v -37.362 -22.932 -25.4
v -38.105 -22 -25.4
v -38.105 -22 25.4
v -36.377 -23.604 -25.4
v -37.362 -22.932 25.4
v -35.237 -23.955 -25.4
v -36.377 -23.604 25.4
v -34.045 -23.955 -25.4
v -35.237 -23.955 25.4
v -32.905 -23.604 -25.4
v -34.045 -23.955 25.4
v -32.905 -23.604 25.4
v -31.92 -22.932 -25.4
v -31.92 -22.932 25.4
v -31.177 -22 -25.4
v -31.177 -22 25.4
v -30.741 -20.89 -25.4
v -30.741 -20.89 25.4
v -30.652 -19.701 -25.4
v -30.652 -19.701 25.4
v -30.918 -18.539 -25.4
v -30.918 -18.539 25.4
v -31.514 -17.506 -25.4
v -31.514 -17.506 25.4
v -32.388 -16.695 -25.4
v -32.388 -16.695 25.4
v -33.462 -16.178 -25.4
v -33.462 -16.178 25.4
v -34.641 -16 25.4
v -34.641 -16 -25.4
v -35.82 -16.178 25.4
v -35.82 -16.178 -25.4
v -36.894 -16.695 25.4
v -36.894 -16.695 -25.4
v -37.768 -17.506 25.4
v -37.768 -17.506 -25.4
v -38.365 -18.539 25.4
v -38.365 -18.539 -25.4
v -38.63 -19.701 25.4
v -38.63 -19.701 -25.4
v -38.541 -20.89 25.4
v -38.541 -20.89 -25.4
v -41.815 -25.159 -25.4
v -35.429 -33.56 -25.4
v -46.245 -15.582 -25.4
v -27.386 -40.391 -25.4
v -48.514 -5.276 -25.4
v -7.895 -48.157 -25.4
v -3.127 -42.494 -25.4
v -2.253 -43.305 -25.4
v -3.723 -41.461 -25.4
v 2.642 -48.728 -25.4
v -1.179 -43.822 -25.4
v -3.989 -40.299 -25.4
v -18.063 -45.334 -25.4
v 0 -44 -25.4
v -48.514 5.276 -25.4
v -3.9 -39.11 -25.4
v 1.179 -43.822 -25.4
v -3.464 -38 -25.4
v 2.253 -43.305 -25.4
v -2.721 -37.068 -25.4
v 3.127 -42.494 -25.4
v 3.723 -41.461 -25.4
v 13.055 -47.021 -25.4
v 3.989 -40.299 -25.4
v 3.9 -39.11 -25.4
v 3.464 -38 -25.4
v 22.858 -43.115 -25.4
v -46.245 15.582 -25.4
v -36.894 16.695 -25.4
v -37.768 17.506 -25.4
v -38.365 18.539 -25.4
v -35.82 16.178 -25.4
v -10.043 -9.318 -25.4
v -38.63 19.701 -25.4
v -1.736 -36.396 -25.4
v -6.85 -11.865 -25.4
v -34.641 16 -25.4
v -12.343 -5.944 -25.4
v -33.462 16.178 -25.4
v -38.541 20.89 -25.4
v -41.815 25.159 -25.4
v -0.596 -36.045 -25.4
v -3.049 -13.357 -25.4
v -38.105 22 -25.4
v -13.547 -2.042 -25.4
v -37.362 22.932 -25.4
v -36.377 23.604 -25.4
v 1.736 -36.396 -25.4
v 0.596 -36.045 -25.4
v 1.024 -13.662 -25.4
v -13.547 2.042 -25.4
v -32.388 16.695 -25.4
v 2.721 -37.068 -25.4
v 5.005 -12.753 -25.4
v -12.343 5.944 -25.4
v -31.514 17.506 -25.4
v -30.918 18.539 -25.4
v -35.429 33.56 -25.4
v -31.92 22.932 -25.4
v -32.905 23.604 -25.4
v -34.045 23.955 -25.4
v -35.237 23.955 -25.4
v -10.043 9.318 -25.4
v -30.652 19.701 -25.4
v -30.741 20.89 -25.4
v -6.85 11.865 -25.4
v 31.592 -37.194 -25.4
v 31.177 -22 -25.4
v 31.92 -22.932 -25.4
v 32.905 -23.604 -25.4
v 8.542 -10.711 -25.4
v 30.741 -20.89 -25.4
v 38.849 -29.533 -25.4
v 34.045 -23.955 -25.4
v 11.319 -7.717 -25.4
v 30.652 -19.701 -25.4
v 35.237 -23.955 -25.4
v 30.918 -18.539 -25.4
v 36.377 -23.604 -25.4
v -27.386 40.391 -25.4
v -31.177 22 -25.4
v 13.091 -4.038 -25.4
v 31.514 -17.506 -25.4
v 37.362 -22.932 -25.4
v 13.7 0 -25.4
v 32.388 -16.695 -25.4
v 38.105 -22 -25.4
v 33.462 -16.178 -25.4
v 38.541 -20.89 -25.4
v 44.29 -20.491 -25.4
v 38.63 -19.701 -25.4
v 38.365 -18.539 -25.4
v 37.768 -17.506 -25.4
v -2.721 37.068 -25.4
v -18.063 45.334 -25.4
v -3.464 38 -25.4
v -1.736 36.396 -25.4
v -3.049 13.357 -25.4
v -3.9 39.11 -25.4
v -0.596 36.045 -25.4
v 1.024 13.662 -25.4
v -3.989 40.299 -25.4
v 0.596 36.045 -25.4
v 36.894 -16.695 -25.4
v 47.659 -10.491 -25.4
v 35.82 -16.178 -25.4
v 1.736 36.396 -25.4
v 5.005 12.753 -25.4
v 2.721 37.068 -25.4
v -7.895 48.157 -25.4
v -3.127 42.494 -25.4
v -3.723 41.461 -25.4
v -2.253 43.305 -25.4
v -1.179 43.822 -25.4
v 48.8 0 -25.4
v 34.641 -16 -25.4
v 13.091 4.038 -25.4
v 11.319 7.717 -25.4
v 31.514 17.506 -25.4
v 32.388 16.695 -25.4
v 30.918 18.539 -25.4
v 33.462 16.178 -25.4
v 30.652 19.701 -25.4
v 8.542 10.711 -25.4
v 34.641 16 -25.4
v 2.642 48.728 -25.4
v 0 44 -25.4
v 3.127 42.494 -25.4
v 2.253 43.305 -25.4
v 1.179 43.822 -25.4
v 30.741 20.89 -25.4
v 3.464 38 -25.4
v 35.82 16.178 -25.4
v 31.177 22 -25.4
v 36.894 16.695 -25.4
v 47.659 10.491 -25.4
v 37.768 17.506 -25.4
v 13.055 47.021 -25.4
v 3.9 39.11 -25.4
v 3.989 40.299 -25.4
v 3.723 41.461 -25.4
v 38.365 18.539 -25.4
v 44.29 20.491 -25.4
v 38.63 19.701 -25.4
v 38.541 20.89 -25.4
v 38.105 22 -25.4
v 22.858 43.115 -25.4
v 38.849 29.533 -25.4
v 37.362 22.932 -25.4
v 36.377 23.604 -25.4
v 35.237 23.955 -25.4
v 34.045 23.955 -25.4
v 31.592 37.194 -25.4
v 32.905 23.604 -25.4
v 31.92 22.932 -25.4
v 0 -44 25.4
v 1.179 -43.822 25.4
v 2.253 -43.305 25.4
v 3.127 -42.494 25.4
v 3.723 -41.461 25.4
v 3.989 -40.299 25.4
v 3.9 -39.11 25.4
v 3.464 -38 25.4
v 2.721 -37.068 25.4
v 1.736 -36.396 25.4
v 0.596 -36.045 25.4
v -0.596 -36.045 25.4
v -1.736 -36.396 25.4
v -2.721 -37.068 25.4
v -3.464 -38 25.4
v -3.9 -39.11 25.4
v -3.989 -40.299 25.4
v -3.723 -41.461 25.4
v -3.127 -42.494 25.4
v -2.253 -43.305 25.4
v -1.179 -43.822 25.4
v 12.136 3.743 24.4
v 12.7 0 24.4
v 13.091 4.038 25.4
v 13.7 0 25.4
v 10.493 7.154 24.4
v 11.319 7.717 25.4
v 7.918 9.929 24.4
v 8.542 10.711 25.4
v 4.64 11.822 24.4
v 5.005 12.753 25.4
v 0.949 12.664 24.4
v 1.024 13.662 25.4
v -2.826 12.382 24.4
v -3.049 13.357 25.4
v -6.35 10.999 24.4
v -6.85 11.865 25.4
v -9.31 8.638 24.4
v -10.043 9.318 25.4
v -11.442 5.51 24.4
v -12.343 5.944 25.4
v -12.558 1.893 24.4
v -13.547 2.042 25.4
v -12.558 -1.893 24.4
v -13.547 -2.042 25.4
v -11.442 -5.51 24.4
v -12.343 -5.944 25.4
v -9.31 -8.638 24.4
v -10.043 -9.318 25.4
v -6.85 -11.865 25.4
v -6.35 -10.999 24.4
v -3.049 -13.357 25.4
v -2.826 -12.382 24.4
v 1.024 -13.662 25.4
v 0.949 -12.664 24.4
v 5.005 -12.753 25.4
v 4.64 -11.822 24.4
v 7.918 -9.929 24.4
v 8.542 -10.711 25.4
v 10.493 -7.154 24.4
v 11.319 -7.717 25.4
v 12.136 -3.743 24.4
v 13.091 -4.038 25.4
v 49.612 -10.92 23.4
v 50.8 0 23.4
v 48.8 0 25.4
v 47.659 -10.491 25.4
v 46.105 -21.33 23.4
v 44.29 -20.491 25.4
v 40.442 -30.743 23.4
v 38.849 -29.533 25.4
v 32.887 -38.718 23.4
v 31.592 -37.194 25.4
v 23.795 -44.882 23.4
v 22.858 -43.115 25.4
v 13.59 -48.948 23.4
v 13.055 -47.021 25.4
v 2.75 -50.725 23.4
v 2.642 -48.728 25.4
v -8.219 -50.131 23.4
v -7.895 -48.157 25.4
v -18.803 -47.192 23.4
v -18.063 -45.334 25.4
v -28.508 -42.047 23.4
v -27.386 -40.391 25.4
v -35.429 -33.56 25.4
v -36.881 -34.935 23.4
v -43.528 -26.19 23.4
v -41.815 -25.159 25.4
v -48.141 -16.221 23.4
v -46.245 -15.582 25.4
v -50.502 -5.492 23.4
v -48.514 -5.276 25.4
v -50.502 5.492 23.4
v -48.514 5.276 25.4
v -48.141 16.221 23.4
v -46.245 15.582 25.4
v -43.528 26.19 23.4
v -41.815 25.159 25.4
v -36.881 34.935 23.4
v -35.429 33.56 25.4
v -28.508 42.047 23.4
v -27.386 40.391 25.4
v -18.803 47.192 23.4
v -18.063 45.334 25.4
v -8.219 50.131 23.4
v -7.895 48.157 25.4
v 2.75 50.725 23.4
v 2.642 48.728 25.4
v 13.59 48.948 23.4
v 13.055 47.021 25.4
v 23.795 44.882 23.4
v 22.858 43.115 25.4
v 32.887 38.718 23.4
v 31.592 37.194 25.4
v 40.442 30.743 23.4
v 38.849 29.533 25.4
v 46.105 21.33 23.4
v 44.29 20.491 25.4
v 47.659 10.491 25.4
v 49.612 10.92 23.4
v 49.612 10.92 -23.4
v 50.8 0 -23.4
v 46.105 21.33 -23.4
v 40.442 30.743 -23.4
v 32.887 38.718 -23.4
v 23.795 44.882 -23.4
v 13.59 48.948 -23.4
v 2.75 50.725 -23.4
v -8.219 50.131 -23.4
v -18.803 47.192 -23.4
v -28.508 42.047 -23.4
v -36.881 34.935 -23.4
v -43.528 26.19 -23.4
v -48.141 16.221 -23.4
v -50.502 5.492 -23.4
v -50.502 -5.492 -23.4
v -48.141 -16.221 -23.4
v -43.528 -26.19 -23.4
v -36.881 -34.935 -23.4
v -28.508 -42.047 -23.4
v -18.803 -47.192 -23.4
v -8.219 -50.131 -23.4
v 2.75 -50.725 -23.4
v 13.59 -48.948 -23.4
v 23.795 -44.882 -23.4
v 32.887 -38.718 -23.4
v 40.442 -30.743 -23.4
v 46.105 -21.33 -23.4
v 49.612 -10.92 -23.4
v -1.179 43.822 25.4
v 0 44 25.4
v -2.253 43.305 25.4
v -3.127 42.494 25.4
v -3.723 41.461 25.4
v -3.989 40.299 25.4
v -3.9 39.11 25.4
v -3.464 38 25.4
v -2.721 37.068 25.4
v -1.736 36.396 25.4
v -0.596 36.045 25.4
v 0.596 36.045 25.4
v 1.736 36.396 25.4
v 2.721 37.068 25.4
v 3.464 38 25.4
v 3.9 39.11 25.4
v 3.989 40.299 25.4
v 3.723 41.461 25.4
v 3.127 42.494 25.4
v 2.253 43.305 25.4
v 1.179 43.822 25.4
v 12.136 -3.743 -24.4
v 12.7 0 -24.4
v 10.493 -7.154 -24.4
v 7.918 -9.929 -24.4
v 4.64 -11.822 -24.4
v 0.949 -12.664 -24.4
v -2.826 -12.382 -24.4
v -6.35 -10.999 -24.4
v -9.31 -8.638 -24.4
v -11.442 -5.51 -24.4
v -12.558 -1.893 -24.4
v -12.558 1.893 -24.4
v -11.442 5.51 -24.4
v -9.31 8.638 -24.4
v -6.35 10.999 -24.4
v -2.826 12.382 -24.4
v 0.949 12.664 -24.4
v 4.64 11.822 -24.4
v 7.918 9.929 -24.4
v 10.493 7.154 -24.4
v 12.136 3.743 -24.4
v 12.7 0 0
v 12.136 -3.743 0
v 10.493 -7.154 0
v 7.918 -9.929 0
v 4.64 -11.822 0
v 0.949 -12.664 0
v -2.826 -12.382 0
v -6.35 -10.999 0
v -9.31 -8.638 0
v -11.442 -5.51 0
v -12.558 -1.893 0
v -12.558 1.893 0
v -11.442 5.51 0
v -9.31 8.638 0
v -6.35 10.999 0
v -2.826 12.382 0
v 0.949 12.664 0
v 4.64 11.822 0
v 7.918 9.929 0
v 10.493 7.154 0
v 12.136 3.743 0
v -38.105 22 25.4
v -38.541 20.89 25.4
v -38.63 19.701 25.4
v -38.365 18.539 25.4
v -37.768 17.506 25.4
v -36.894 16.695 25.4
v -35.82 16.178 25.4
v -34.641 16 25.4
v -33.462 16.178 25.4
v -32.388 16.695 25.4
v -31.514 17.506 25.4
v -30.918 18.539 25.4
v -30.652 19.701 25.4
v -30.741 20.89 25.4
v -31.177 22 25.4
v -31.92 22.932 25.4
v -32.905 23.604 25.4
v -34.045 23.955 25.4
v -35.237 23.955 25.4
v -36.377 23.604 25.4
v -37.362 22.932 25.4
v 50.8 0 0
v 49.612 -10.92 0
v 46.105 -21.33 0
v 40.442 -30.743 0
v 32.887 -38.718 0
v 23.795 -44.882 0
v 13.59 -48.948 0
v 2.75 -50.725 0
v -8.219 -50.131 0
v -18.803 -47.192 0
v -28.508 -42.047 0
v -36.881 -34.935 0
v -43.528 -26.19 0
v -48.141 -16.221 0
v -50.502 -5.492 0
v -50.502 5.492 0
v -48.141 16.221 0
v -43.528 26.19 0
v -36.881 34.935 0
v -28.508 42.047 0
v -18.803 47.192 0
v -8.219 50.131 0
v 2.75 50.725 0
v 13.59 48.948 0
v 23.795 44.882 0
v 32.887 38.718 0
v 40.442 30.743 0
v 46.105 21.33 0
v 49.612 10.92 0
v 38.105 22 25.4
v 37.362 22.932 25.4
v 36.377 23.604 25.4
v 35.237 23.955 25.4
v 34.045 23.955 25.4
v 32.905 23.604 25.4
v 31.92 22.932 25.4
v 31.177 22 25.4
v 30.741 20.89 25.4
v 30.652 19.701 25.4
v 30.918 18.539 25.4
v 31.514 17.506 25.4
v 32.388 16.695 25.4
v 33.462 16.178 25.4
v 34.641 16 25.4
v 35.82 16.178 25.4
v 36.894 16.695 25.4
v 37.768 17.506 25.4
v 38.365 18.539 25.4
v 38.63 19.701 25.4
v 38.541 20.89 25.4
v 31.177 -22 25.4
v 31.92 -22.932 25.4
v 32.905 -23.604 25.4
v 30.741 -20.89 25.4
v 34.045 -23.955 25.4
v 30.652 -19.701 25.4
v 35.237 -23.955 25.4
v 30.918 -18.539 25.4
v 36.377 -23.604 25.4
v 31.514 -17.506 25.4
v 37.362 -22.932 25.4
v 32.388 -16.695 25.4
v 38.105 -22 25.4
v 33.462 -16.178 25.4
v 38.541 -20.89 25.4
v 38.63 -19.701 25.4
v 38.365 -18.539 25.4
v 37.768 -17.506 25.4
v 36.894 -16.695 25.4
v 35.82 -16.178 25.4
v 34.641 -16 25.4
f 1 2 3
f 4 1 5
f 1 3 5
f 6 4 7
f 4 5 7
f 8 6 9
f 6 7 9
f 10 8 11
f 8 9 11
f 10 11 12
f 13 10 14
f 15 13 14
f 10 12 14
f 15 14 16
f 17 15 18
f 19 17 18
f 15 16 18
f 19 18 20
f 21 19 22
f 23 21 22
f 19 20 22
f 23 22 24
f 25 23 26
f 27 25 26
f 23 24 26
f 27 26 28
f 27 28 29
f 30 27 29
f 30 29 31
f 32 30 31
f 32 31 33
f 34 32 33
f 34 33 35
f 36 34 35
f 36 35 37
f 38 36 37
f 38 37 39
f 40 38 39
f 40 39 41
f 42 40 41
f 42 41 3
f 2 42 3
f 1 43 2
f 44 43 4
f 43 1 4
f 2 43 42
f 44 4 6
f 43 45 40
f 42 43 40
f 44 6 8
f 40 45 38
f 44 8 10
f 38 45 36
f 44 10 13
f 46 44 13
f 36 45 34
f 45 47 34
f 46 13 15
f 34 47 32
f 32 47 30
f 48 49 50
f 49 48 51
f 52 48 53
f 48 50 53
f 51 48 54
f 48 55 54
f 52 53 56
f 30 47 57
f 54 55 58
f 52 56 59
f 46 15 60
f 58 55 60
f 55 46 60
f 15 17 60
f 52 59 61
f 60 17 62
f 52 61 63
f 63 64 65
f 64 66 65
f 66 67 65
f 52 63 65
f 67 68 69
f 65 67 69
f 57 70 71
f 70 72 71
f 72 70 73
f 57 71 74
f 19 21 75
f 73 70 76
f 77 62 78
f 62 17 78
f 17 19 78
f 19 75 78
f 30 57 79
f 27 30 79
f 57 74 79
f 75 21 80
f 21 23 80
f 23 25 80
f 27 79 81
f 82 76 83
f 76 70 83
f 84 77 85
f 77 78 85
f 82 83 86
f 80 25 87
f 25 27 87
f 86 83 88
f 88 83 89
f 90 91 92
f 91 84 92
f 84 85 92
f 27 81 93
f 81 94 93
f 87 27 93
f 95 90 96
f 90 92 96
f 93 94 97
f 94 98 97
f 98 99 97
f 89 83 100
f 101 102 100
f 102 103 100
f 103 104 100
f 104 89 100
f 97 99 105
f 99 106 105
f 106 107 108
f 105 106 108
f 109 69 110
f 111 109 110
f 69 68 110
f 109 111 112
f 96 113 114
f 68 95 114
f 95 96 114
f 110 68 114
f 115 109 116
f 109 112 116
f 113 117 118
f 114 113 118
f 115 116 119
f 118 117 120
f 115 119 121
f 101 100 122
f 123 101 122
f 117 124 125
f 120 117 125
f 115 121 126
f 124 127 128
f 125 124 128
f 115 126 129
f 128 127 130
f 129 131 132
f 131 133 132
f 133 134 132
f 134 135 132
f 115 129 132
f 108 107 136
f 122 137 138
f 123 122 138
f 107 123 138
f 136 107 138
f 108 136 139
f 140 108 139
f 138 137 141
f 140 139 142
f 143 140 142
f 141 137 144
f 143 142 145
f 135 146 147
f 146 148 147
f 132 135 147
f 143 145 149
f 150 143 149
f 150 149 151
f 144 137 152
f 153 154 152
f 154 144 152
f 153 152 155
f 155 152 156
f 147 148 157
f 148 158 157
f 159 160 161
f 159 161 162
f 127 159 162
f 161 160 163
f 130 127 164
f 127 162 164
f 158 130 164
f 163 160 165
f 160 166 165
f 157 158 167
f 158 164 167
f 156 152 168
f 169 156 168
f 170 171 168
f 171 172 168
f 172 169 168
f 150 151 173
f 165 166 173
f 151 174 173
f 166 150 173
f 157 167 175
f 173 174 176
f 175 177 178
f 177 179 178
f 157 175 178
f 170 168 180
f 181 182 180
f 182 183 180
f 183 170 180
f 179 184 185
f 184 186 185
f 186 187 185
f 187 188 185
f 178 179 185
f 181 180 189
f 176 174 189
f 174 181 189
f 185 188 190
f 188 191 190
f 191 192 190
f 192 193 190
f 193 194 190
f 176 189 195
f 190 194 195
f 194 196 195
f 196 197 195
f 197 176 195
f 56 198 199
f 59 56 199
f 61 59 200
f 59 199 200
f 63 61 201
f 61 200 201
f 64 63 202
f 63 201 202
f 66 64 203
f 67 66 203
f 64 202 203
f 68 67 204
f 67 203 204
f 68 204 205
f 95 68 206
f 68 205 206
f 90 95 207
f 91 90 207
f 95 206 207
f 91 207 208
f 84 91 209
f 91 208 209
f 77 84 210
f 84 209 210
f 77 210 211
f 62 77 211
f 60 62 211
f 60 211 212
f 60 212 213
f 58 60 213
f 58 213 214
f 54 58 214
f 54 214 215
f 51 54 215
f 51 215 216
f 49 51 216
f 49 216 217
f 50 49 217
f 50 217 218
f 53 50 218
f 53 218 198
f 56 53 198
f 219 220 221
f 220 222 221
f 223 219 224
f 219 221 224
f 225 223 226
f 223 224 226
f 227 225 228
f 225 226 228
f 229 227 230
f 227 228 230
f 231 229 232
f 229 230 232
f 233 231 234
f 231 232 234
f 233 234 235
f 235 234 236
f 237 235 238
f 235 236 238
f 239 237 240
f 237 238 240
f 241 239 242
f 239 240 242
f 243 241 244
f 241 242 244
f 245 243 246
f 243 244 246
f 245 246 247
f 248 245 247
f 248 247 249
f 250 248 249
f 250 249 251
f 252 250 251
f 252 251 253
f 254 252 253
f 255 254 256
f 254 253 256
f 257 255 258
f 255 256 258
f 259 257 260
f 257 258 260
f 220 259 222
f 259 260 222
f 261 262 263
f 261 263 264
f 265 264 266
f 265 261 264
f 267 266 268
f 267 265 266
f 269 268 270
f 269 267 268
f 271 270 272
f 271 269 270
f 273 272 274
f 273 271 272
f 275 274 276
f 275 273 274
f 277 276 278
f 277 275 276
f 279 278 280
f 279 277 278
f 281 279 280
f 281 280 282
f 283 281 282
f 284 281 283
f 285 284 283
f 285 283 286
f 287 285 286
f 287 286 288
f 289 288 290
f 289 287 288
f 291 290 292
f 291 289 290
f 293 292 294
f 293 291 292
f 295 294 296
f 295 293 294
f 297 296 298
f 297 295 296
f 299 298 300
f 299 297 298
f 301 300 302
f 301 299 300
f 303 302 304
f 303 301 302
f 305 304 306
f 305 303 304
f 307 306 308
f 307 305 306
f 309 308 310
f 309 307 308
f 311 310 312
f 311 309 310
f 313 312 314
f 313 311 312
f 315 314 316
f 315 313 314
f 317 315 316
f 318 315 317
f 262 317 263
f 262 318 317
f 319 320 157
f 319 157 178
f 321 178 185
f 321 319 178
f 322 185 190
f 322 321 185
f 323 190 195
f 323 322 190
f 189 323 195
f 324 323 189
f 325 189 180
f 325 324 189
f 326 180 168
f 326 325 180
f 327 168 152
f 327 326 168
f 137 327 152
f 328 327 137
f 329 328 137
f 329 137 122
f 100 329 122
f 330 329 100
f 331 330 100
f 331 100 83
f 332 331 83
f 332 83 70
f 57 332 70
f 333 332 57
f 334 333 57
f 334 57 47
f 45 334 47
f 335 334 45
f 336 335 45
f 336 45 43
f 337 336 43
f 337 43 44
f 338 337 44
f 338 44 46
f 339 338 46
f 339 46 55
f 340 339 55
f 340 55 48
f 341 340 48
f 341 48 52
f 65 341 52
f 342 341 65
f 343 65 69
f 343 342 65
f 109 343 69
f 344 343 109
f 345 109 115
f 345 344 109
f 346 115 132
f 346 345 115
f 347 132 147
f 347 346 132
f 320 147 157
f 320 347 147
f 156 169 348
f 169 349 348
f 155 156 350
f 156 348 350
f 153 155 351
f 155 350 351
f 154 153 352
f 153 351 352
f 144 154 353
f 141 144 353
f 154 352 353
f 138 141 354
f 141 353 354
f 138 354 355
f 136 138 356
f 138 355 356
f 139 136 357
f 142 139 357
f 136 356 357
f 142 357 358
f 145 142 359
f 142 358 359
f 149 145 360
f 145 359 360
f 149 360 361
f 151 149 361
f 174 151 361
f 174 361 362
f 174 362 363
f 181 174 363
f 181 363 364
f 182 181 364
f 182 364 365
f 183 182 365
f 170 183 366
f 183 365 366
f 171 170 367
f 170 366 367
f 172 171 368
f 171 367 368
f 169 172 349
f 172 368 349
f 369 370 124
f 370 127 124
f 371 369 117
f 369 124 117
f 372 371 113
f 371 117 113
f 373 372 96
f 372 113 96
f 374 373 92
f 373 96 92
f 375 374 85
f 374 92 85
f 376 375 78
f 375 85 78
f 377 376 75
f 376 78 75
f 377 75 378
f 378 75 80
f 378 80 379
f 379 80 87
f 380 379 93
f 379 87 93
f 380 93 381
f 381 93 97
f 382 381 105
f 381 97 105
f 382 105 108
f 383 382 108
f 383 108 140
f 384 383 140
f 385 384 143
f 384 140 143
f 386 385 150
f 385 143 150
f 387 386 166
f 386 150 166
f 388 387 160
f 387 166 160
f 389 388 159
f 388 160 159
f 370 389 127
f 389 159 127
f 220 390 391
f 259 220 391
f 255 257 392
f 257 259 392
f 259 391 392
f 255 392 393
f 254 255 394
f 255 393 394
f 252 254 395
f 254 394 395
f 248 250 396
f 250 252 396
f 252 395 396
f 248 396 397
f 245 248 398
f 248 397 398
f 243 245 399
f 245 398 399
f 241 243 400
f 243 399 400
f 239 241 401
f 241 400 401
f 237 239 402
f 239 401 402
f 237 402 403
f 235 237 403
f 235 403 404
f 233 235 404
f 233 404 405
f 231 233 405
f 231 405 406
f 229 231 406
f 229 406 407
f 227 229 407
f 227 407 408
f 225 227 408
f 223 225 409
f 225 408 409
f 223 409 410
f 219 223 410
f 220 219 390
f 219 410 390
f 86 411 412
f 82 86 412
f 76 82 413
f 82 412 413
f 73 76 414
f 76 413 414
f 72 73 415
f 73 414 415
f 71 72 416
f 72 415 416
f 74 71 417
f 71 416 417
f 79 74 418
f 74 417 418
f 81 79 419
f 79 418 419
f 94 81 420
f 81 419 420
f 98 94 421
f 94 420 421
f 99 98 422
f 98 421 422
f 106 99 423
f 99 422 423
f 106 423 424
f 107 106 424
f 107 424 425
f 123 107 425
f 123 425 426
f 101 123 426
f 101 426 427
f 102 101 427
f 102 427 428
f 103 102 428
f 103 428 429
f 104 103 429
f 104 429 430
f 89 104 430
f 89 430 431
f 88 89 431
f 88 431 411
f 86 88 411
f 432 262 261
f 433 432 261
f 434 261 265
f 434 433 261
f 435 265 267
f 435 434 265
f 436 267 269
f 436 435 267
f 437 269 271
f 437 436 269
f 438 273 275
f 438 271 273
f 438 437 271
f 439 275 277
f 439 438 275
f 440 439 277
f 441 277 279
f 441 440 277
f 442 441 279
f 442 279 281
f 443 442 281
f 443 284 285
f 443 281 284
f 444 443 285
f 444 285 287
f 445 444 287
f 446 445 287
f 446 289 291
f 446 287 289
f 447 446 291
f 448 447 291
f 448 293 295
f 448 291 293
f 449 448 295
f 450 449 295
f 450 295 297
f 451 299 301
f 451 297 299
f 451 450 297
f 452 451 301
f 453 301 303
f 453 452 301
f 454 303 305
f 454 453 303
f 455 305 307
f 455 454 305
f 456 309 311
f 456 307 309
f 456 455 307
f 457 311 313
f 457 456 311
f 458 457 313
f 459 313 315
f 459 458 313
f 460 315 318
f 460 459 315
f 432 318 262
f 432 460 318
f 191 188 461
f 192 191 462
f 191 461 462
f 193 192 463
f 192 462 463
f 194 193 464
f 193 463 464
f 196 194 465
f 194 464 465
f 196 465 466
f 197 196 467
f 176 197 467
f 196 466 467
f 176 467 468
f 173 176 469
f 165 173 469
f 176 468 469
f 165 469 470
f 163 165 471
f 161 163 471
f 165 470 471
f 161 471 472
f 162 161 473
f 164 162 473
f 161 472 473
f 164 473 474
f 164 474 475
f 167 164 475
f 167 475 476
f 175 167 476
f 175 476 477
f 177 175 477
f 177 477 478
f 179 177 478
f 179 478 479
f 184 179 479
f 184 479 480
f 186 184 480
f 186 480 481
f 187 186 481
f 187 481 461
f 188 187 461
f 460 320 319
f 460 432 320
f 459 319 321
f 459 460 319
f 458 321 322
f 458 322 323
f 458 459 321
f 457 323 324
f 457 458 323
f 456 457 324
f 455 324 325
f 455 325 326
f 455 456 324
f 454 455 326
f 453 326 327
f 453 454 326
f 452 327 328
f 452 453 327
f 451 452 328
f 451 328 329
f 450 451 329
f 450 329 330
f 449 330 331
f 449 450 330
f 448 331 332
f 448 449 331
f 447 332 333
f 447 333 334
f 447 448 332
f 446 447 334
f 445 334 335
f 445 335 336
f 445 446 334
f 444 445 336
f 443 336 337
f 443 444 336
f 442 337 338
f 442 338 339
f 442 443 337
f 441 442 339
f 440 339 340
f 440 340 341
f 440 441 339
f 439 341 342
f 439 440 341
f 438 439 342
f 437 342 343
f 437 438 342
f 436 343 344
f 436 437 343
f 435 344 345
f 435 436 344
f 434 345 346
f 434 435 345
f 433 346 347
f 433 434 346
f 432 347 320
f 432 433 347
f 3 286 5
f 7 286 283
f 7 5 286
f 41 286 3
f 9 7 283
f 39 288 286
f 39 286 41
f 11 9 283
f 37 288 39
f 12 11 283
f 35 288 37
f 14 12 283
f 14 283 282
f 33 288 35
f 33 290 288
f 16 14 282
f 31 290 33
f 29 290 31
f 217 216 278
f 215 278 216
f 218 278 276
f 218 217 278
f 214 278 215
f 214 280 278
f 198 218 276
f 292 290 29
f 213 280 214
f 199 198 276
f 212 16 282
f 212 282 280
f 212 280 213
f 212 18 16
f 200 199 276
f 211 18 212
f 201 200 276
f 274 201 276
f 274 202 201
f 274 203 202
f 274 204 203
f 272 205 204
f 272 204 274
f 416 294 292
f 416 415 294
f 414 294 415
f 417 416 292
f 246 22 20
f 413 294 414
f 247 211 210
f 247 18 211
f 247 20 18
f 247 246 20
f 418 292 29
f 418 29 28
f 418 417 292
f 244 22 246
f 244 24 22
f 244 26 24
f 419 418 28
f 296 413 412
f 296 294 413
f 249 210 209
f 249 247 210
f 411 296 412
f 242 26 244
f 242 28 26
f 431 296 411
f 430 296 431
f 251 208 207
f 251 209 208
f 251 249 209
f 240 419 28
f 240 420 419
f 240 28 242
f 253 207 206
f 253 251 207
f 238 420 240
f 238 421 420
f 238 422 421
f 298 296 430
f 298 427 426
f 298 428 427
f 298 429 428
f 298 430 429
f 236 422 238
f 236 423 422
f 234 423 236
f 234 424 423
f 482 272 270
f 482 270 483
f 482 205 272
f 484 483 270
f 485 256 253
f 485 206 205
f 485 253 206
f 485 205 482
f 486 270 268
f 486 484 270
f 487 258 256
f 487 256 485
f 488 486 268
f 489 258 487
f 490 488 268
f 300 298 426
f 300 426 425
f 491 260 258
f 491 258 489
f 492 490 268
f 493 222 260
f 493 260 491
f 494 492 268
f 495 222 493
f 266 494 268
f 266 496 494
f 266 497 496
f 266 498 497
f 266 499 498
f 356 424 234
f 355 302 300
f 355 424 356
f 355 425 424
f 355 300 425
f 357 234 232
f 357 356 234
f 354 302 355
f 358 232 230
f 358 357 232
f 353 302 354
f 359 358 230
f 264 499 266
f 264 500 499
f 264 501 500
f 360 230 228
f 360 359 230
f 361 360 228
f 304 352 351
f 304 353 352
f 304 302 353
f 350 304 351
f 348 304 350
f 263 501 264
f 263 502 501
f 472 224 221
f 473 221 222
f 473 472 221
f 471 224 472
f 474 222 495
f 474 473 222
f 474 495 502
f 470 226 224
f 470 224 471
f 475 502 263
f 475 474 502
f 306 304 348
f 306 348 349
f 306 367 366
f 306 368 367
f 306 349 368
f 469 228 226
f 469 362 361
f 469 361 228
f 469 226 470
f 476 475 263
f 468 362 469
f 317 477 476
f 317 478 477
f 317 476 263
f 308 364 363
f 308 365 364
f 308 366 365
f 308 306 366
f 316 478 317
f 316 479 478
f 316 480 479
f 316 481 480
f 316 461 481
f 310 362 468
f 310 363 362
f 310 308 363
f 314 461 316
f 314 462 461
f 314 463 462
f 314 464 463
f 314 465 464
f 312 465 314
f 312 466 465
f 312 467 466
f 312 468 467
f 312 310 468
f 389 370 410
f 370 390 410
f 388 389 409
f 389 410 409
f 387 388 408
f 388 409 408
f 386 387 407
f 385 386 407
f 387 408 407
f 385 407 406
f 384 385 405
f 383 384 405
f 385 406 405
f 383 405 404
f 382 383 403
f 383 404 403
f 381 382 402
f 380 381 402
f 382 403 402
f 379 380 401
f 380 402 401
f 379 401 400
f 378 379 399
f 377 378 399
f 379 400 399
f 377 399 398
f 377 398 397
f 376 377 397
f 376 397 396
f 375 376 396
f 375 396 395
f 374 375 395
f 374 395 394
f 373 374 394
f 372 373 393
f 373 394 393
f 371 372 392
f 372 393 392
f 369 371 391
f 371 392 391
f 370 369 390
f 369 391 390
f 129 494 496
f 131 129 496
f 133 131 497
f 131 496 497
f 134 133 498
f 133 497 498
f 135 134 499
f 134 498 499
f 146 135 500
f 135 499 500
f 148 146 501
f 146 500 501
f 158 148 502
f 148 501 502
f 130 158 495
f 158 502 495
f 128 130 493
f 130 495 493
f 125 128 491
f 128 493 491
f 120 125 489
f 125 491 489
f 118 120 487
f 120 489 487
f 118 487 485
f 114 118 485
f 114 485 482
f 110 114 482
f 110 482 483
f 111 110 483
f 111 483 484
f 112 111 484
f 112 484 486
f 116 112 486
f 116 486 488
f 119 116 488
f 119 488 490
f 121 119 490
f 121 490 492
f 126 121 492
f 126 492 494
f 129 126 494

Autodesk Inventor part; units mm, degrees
sketch "Sketch1" plane through (0, 0, 0) normal (0, 0, 1) x (1, 0, 0)
  circle A0 centre (0, 0) radius 12.7
  circle A1 centre (0, 0) radius 50.8
  dimension "d0" = 101.6
  dimension "d1" = 25.4
extrude "Extrusion1" add sketch "Sketch1" along normal mid plane 50.8
sketch "Sketch2" plane through (0, 0, -25.4) normal (0, 0, -1) x (-1, 0, 0)
  circle A0 centre (0, 0) radius 40 construction
  circle A1 centre (0, 0) radius 12.7 construction
  line L0 (0, 0) -> (0, 40) construction
  dimension "d4" = 80
hole "Hole1" at (0, 40, -25.4) direction (0, 0, 1) diameter 8 end through all
pattern_circular "Circular Pattern1" count 6 over 360 about axis through (0, 0, -10) along (0, 0, 1) of "Hole1"
chamfer "Chamfer1" distance 2 angle 45 2 edges at (-50.8, 0, -25.4) (-50.8, 0, 25.4)
chamfer "Chamfer2" distance 1 angle 45 2 edges at (-12.7, 0, -25.4) (-12.7, 0, 25.4)
properties part number "Porsche_912_CV_Joint"
